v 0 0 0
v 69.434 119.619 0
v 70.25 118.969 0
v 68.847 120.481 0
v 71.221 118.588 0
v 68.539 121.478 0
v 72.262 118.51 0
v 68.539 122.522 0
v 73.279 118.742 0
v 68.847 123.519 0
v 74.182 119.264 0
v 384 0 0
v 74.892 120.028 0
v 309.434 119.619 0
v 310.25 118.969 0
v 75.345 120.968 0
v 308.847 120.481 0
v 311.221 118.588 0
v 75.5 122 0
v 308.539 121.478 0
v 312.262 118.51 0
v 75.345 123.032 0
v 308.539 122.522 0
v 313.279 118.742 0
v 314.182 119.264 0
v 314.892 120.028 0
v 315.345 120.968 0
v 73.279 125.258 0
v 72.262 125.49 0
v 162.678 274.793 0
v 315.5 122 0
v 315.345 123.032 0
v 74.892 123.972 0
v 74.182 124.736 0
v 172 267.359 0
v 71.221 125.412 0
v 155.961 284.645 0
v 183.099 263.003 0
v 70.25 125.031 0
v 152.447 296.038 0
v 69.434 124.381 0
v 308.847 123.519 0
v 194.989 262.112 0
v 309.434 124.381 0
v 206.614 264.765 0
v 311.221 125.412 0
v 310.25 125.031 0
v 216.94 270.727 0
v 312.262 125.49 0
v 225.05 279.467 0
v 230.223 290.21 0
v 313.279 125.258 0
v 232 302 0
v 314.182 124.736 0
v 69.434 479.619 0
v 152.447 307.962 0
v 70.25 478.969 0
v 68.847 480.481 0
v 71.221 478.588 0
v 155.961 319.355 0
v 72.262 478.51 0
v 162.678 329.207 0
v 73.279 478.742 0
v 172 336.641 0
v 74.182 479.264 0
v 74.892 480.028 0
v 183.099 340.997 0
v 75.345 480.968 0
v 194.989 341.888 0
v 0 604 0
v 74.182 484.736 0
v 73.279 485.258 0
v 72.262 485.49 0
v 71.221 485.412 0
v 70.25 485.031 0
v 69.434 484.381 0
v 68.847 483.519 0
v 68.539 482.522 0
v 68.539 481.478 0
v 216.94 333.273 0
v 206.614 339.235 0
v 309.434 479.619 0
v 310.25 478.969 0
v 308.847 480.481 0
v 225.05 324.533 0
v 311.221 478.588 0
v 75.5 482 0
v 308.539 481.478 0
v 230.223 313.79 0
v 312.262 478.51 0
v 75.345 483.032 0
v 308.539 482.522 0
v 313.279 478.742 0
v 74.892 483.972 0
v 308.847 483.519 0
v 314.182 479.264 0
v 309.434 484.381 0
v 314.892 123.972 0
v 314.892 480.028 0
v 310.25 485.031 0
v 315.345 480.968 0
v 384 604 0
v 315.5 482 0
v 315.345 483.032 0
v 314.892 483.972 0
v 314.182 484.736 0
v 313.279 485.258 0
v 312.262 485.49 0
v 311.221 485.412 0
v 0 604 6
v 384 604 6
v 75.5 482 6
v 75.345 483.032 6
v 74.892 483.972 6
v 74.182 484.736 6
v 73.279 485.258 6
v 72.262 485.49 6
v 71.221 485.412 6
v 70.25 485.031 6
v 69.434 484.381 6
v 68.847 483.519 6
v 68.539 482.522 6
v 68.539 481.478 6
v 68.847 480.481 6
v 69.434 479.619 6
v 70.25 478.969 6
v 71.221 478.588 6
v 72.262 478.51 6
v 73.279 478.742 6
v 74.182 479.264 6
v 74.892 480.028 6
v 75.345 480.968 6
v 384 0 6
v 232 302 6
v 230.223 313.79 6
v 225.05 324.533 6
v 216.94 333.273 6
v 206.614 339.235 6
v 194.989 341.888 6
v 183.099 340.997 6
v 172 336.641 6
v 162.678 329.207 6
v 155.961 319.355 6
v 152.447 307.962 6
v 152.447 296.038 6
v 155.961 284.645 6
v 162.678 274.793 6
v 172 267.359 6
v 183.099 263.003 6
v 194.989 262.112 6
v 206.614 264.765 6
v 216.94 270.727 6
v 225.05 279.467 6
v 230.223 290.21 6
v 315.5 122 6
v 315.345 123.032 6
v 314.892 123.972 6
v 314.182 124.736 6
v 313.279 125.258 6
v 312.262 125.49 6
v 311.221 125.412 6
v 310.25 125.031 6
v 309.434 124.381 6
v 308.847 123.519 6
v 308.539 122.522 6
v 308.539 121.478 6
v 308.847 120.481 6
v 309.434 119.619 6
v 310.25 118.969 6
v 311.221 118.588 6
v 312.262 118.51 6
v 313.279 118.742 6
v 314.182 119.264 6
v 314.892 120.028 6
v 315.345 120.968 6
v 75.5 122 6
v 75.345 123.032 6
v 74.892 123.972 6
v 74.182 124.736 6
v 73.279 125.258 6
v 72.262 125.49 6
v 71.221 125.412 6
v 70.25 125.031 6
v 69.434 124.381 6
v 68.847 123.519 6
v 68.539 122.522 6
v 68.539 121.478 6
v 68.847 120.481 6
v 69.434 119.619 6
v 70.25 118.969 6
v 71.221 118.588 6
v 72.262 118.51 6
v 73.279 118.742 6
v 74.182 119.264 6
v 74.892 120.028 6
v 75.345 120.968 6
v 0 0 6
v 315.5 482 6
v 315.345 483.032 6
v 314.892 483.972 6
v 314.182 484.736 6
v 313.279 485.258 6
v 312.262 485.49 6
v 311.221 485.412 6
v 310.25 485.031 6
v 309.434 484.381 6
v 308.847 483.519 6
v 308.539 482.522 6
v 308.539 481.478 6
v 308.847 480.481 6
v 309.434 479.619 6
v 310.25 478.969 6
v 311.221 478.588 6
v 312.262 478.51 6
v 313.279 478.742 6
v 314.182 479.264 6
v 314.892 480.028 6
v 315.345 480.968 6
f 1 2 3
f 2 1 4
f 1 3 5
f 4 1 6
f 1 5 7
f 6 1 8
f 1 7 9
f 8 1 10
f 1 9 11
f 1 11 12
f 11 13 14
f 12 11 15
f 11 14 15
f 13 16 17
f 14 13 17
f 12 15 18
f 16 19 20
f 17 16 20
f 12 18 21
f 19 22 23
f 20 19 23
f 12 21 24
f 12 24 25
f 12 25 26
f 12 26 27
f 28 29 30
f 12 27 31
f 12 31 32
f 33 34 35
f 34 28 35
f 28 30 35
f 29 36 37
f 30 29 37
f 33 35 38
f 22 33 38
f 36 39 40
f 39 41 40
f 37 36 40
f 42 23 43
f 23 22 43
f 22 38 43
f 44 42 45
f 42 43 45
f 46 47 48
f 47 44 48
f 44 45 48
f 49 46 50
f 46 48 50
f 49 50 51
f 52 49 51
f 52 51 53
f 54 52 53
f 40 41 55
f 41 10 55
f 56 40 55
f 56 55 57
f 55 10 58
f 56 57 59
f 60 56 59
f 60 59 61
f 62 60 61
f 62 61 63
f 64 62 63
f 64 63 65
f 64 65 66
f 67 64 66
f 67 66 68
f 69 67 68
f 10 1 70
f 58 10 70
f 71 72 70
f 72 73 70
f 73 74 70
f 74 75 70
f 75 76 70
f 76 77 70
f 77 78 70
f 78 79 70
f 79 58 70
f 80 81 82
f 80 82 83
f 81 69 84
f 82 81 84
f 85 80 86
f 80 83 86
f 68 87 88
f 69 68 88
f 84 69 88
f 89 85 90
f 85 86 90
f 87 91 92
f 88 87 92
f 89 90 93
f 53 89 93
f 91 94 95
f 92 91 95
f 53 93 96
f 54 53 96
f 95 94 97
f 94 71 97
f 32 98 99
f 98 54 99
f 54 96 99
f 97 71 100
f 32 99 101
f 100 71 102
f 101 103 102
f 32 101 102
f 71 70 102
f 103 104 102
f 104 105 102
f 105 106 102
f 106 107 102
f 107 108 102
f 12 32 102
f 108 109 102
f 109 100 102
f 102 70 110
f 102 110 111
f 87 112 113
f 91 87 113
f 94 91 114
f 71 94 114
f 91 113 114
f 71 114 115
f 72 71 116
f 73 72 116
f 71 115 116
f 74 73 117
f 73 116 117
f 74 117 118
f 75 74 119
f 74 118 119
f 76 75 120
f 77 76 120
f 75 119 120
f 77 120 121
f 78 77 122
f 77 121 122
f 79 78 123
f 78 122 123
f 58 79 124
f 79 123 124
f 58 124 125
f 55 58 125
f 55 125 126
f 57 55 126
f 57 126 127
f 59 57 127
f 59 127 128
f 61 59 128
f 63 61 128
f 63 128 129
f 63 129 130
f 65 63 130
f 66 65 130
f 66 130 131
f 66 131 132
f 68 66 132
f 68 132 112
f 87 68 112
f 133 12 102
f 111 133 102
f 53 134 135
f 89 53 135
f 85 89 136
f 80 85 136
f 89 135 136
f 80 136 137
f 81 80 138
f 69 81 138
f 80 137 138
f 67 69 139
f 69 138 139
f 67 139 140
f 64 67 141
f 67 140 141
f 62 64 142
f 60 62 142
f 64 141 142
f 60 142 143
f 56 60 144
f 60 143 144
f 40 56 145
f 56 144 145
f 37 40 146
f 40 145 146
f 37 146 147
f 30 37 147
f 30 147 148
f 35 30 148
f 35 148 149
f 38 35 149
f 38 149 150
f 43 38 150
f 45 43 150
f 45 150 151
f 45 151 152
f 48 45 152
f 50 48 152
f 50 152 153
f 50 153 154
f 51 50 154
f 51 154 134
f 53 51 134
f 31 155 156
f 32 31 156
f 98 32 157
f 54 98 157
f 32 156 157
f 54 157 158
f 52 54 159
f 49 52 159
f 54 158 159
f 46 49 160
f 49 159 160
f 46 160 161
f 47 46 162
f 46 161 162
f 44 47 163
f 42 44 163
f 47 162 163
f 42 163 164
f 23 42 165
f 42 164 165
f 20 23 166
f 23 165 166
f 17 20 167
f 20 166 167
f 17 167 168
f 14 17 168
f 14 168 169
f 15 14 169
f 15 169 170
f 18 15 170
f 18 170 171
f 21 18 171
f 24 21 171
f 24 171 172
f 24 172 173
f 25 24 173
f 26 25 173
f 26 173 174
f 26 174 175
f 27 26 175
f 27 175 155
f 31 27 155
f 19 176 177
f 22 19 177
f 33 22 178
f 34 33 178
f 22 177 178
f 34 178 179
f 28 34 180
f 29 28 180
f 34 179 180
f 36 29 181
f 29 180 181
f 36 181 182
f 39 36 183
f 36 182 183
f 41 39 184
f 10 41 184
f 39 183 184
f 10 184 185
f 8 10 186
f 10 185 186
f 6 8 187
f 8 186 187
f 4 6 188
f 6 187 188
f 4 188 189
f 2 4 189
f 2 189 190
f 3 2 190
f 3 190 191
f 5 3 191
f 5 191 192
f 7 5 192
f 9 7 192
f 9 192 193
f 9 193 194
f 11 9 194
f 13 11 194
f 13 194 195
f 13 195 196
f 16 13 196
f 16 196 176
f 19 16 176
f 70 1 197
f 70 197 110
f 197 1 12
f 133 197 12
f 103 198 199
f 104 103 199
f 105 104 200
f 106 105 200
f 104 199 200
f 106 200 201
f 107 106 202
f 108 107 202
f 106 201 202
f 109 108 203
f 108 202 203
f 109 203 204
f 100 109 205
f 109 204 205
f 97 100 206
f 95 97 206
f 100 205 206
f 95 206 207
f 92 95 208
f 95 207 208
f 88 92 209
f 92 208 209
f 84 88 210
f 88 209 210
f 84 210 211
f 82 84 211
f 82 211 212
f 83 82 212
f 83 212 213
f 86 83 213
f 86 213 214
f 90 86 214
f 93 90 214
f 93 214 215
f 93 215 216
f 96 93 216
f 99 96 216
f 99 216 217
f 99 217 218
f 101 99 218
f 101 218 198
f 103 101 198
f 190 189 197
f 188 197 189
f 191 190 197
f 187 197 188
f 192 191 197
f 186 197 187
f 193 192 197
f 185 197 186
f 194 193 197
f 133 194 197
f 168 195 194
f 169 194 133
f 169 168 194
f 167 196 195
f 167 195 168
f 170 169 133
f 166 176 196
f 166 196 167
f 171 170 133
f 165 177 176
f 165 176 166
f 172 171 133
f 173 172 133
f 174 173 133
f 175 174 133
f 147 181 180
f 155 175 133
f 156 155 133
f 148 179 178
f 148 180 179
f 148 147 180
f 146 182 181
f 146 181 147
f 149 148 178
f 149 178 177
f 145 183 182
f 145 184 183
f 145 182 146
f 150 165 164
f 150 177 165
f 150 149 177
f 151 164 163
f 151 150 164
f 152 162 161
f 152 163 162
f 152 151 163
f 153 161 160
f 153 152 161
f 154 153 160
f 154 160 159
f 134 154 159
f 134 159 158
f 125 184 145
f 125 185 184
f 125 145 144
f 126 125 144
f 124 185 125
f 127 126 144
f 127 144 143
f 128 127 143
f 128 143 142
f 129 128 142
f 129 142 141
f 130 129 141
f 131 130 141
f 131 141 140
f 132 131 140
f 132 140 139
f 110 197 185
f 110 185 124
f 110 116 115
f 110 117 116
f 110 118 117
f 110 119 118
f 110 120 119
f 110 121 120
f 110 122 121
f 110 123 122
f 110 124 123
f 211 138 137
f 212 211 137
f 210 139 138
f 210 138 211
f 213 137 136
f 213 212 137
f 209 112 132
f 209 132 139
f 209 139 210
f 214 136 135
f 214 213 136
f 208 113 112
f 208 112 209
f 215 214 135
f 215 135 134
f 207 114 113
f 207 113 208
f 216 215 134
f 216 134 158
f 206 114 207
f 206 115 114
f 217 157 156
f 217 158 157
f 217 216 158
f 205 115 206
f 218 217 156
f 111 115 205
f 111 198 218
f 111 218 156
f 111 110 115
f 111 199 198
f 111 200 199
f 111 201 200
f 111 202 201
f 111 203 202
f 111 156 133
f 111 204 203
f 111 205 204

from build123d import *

# Parameters (mm, degrees)
SKETCH_1_W               = 384
SKETCH_1_H               = 604
RECESSED_TOP_SEAT_DEPTH  = 6
SKETCH_2_R               = 40
CENTRAL_ACCESS_DEPTH     = 716.756941985
SKETCH_3_R               = 3.5
FASTENER_CLEARANCE_DEPTH = 716.756941985
SKETCH_4_R               = 3.5
CUT_EXTRUDE_3_DEPTH      = 716.756941985
SKETCH_5_R               = 3.5
CUT_EXTRUDE_4_DEPTH      = 716.756941985
SKETCH_6_R               = 3.5
CUT_EXTRUDE_5_DEPTH      = 716.756941985


with BuildPart() as part:
    # 草图1 → Recessed_top_seat (new body)
    with BuildSketch(Plane.XY):
        with Locations((192, 302)):
            Rectangle(SKETCH_1_W, SKETCH_1_H)
    extrude(amount=RECESSED_TOP_SEAT_DEPTH)

    # 草图2 → Central_access (cut, through all)
    with BuildSketch(Plane.XY.offset(6)):
        with Locations((192, 302)):
            Circle(SKETCH_2_R)
    extrude(amount=-CENTRAL_ACCESS_DEPTH, mode=Mode.SUBTRACT)

    # 草图3 → Fastener_clearance (cut, through all)
    with BuildSketch(Plane.XY.offset(6)):
        with Locations((72, 122)):
            Circle(SKETCH_3_R)
    extrude(amount=-FASTENER_CLEARANCE_DEPTH, mode=Mode.SUBTRACT)

    # 草图4 → 切除-拉伸3 (cut, through all)
    with BuildSketch(Plane.XY.offset(6)):
        with Locations((72, 482)):
            Circle(SKETCH_4_R)
    extrude(amount=-CUT_EXTRUDE_3_DEPTH, mode=Mode.SUBTRACT)

    # 草图5 → 切除-拉伸4 (cut, through all)
    with BuildSketch(Plane.XY.offset(6)):
        with Locations((312, 122)):
            Circle(SKETCH_5_R)
    extrude(amount=-CUT_EXTRUDE_4_DEPTH, mode=Mode.SUBTRACT)

    # 草图6 → 切除-拉伸5 (cut, through all)
    with BuildSketch(Plane.XY.offset(6)):
        with Locations((312, 482)):
            Circle(SKETCH_6_R)
    extrude(amount=-CUT_EXTRUDE_5_DEPTH, mode=Mode.SUBTRACT)


solid = part.part
